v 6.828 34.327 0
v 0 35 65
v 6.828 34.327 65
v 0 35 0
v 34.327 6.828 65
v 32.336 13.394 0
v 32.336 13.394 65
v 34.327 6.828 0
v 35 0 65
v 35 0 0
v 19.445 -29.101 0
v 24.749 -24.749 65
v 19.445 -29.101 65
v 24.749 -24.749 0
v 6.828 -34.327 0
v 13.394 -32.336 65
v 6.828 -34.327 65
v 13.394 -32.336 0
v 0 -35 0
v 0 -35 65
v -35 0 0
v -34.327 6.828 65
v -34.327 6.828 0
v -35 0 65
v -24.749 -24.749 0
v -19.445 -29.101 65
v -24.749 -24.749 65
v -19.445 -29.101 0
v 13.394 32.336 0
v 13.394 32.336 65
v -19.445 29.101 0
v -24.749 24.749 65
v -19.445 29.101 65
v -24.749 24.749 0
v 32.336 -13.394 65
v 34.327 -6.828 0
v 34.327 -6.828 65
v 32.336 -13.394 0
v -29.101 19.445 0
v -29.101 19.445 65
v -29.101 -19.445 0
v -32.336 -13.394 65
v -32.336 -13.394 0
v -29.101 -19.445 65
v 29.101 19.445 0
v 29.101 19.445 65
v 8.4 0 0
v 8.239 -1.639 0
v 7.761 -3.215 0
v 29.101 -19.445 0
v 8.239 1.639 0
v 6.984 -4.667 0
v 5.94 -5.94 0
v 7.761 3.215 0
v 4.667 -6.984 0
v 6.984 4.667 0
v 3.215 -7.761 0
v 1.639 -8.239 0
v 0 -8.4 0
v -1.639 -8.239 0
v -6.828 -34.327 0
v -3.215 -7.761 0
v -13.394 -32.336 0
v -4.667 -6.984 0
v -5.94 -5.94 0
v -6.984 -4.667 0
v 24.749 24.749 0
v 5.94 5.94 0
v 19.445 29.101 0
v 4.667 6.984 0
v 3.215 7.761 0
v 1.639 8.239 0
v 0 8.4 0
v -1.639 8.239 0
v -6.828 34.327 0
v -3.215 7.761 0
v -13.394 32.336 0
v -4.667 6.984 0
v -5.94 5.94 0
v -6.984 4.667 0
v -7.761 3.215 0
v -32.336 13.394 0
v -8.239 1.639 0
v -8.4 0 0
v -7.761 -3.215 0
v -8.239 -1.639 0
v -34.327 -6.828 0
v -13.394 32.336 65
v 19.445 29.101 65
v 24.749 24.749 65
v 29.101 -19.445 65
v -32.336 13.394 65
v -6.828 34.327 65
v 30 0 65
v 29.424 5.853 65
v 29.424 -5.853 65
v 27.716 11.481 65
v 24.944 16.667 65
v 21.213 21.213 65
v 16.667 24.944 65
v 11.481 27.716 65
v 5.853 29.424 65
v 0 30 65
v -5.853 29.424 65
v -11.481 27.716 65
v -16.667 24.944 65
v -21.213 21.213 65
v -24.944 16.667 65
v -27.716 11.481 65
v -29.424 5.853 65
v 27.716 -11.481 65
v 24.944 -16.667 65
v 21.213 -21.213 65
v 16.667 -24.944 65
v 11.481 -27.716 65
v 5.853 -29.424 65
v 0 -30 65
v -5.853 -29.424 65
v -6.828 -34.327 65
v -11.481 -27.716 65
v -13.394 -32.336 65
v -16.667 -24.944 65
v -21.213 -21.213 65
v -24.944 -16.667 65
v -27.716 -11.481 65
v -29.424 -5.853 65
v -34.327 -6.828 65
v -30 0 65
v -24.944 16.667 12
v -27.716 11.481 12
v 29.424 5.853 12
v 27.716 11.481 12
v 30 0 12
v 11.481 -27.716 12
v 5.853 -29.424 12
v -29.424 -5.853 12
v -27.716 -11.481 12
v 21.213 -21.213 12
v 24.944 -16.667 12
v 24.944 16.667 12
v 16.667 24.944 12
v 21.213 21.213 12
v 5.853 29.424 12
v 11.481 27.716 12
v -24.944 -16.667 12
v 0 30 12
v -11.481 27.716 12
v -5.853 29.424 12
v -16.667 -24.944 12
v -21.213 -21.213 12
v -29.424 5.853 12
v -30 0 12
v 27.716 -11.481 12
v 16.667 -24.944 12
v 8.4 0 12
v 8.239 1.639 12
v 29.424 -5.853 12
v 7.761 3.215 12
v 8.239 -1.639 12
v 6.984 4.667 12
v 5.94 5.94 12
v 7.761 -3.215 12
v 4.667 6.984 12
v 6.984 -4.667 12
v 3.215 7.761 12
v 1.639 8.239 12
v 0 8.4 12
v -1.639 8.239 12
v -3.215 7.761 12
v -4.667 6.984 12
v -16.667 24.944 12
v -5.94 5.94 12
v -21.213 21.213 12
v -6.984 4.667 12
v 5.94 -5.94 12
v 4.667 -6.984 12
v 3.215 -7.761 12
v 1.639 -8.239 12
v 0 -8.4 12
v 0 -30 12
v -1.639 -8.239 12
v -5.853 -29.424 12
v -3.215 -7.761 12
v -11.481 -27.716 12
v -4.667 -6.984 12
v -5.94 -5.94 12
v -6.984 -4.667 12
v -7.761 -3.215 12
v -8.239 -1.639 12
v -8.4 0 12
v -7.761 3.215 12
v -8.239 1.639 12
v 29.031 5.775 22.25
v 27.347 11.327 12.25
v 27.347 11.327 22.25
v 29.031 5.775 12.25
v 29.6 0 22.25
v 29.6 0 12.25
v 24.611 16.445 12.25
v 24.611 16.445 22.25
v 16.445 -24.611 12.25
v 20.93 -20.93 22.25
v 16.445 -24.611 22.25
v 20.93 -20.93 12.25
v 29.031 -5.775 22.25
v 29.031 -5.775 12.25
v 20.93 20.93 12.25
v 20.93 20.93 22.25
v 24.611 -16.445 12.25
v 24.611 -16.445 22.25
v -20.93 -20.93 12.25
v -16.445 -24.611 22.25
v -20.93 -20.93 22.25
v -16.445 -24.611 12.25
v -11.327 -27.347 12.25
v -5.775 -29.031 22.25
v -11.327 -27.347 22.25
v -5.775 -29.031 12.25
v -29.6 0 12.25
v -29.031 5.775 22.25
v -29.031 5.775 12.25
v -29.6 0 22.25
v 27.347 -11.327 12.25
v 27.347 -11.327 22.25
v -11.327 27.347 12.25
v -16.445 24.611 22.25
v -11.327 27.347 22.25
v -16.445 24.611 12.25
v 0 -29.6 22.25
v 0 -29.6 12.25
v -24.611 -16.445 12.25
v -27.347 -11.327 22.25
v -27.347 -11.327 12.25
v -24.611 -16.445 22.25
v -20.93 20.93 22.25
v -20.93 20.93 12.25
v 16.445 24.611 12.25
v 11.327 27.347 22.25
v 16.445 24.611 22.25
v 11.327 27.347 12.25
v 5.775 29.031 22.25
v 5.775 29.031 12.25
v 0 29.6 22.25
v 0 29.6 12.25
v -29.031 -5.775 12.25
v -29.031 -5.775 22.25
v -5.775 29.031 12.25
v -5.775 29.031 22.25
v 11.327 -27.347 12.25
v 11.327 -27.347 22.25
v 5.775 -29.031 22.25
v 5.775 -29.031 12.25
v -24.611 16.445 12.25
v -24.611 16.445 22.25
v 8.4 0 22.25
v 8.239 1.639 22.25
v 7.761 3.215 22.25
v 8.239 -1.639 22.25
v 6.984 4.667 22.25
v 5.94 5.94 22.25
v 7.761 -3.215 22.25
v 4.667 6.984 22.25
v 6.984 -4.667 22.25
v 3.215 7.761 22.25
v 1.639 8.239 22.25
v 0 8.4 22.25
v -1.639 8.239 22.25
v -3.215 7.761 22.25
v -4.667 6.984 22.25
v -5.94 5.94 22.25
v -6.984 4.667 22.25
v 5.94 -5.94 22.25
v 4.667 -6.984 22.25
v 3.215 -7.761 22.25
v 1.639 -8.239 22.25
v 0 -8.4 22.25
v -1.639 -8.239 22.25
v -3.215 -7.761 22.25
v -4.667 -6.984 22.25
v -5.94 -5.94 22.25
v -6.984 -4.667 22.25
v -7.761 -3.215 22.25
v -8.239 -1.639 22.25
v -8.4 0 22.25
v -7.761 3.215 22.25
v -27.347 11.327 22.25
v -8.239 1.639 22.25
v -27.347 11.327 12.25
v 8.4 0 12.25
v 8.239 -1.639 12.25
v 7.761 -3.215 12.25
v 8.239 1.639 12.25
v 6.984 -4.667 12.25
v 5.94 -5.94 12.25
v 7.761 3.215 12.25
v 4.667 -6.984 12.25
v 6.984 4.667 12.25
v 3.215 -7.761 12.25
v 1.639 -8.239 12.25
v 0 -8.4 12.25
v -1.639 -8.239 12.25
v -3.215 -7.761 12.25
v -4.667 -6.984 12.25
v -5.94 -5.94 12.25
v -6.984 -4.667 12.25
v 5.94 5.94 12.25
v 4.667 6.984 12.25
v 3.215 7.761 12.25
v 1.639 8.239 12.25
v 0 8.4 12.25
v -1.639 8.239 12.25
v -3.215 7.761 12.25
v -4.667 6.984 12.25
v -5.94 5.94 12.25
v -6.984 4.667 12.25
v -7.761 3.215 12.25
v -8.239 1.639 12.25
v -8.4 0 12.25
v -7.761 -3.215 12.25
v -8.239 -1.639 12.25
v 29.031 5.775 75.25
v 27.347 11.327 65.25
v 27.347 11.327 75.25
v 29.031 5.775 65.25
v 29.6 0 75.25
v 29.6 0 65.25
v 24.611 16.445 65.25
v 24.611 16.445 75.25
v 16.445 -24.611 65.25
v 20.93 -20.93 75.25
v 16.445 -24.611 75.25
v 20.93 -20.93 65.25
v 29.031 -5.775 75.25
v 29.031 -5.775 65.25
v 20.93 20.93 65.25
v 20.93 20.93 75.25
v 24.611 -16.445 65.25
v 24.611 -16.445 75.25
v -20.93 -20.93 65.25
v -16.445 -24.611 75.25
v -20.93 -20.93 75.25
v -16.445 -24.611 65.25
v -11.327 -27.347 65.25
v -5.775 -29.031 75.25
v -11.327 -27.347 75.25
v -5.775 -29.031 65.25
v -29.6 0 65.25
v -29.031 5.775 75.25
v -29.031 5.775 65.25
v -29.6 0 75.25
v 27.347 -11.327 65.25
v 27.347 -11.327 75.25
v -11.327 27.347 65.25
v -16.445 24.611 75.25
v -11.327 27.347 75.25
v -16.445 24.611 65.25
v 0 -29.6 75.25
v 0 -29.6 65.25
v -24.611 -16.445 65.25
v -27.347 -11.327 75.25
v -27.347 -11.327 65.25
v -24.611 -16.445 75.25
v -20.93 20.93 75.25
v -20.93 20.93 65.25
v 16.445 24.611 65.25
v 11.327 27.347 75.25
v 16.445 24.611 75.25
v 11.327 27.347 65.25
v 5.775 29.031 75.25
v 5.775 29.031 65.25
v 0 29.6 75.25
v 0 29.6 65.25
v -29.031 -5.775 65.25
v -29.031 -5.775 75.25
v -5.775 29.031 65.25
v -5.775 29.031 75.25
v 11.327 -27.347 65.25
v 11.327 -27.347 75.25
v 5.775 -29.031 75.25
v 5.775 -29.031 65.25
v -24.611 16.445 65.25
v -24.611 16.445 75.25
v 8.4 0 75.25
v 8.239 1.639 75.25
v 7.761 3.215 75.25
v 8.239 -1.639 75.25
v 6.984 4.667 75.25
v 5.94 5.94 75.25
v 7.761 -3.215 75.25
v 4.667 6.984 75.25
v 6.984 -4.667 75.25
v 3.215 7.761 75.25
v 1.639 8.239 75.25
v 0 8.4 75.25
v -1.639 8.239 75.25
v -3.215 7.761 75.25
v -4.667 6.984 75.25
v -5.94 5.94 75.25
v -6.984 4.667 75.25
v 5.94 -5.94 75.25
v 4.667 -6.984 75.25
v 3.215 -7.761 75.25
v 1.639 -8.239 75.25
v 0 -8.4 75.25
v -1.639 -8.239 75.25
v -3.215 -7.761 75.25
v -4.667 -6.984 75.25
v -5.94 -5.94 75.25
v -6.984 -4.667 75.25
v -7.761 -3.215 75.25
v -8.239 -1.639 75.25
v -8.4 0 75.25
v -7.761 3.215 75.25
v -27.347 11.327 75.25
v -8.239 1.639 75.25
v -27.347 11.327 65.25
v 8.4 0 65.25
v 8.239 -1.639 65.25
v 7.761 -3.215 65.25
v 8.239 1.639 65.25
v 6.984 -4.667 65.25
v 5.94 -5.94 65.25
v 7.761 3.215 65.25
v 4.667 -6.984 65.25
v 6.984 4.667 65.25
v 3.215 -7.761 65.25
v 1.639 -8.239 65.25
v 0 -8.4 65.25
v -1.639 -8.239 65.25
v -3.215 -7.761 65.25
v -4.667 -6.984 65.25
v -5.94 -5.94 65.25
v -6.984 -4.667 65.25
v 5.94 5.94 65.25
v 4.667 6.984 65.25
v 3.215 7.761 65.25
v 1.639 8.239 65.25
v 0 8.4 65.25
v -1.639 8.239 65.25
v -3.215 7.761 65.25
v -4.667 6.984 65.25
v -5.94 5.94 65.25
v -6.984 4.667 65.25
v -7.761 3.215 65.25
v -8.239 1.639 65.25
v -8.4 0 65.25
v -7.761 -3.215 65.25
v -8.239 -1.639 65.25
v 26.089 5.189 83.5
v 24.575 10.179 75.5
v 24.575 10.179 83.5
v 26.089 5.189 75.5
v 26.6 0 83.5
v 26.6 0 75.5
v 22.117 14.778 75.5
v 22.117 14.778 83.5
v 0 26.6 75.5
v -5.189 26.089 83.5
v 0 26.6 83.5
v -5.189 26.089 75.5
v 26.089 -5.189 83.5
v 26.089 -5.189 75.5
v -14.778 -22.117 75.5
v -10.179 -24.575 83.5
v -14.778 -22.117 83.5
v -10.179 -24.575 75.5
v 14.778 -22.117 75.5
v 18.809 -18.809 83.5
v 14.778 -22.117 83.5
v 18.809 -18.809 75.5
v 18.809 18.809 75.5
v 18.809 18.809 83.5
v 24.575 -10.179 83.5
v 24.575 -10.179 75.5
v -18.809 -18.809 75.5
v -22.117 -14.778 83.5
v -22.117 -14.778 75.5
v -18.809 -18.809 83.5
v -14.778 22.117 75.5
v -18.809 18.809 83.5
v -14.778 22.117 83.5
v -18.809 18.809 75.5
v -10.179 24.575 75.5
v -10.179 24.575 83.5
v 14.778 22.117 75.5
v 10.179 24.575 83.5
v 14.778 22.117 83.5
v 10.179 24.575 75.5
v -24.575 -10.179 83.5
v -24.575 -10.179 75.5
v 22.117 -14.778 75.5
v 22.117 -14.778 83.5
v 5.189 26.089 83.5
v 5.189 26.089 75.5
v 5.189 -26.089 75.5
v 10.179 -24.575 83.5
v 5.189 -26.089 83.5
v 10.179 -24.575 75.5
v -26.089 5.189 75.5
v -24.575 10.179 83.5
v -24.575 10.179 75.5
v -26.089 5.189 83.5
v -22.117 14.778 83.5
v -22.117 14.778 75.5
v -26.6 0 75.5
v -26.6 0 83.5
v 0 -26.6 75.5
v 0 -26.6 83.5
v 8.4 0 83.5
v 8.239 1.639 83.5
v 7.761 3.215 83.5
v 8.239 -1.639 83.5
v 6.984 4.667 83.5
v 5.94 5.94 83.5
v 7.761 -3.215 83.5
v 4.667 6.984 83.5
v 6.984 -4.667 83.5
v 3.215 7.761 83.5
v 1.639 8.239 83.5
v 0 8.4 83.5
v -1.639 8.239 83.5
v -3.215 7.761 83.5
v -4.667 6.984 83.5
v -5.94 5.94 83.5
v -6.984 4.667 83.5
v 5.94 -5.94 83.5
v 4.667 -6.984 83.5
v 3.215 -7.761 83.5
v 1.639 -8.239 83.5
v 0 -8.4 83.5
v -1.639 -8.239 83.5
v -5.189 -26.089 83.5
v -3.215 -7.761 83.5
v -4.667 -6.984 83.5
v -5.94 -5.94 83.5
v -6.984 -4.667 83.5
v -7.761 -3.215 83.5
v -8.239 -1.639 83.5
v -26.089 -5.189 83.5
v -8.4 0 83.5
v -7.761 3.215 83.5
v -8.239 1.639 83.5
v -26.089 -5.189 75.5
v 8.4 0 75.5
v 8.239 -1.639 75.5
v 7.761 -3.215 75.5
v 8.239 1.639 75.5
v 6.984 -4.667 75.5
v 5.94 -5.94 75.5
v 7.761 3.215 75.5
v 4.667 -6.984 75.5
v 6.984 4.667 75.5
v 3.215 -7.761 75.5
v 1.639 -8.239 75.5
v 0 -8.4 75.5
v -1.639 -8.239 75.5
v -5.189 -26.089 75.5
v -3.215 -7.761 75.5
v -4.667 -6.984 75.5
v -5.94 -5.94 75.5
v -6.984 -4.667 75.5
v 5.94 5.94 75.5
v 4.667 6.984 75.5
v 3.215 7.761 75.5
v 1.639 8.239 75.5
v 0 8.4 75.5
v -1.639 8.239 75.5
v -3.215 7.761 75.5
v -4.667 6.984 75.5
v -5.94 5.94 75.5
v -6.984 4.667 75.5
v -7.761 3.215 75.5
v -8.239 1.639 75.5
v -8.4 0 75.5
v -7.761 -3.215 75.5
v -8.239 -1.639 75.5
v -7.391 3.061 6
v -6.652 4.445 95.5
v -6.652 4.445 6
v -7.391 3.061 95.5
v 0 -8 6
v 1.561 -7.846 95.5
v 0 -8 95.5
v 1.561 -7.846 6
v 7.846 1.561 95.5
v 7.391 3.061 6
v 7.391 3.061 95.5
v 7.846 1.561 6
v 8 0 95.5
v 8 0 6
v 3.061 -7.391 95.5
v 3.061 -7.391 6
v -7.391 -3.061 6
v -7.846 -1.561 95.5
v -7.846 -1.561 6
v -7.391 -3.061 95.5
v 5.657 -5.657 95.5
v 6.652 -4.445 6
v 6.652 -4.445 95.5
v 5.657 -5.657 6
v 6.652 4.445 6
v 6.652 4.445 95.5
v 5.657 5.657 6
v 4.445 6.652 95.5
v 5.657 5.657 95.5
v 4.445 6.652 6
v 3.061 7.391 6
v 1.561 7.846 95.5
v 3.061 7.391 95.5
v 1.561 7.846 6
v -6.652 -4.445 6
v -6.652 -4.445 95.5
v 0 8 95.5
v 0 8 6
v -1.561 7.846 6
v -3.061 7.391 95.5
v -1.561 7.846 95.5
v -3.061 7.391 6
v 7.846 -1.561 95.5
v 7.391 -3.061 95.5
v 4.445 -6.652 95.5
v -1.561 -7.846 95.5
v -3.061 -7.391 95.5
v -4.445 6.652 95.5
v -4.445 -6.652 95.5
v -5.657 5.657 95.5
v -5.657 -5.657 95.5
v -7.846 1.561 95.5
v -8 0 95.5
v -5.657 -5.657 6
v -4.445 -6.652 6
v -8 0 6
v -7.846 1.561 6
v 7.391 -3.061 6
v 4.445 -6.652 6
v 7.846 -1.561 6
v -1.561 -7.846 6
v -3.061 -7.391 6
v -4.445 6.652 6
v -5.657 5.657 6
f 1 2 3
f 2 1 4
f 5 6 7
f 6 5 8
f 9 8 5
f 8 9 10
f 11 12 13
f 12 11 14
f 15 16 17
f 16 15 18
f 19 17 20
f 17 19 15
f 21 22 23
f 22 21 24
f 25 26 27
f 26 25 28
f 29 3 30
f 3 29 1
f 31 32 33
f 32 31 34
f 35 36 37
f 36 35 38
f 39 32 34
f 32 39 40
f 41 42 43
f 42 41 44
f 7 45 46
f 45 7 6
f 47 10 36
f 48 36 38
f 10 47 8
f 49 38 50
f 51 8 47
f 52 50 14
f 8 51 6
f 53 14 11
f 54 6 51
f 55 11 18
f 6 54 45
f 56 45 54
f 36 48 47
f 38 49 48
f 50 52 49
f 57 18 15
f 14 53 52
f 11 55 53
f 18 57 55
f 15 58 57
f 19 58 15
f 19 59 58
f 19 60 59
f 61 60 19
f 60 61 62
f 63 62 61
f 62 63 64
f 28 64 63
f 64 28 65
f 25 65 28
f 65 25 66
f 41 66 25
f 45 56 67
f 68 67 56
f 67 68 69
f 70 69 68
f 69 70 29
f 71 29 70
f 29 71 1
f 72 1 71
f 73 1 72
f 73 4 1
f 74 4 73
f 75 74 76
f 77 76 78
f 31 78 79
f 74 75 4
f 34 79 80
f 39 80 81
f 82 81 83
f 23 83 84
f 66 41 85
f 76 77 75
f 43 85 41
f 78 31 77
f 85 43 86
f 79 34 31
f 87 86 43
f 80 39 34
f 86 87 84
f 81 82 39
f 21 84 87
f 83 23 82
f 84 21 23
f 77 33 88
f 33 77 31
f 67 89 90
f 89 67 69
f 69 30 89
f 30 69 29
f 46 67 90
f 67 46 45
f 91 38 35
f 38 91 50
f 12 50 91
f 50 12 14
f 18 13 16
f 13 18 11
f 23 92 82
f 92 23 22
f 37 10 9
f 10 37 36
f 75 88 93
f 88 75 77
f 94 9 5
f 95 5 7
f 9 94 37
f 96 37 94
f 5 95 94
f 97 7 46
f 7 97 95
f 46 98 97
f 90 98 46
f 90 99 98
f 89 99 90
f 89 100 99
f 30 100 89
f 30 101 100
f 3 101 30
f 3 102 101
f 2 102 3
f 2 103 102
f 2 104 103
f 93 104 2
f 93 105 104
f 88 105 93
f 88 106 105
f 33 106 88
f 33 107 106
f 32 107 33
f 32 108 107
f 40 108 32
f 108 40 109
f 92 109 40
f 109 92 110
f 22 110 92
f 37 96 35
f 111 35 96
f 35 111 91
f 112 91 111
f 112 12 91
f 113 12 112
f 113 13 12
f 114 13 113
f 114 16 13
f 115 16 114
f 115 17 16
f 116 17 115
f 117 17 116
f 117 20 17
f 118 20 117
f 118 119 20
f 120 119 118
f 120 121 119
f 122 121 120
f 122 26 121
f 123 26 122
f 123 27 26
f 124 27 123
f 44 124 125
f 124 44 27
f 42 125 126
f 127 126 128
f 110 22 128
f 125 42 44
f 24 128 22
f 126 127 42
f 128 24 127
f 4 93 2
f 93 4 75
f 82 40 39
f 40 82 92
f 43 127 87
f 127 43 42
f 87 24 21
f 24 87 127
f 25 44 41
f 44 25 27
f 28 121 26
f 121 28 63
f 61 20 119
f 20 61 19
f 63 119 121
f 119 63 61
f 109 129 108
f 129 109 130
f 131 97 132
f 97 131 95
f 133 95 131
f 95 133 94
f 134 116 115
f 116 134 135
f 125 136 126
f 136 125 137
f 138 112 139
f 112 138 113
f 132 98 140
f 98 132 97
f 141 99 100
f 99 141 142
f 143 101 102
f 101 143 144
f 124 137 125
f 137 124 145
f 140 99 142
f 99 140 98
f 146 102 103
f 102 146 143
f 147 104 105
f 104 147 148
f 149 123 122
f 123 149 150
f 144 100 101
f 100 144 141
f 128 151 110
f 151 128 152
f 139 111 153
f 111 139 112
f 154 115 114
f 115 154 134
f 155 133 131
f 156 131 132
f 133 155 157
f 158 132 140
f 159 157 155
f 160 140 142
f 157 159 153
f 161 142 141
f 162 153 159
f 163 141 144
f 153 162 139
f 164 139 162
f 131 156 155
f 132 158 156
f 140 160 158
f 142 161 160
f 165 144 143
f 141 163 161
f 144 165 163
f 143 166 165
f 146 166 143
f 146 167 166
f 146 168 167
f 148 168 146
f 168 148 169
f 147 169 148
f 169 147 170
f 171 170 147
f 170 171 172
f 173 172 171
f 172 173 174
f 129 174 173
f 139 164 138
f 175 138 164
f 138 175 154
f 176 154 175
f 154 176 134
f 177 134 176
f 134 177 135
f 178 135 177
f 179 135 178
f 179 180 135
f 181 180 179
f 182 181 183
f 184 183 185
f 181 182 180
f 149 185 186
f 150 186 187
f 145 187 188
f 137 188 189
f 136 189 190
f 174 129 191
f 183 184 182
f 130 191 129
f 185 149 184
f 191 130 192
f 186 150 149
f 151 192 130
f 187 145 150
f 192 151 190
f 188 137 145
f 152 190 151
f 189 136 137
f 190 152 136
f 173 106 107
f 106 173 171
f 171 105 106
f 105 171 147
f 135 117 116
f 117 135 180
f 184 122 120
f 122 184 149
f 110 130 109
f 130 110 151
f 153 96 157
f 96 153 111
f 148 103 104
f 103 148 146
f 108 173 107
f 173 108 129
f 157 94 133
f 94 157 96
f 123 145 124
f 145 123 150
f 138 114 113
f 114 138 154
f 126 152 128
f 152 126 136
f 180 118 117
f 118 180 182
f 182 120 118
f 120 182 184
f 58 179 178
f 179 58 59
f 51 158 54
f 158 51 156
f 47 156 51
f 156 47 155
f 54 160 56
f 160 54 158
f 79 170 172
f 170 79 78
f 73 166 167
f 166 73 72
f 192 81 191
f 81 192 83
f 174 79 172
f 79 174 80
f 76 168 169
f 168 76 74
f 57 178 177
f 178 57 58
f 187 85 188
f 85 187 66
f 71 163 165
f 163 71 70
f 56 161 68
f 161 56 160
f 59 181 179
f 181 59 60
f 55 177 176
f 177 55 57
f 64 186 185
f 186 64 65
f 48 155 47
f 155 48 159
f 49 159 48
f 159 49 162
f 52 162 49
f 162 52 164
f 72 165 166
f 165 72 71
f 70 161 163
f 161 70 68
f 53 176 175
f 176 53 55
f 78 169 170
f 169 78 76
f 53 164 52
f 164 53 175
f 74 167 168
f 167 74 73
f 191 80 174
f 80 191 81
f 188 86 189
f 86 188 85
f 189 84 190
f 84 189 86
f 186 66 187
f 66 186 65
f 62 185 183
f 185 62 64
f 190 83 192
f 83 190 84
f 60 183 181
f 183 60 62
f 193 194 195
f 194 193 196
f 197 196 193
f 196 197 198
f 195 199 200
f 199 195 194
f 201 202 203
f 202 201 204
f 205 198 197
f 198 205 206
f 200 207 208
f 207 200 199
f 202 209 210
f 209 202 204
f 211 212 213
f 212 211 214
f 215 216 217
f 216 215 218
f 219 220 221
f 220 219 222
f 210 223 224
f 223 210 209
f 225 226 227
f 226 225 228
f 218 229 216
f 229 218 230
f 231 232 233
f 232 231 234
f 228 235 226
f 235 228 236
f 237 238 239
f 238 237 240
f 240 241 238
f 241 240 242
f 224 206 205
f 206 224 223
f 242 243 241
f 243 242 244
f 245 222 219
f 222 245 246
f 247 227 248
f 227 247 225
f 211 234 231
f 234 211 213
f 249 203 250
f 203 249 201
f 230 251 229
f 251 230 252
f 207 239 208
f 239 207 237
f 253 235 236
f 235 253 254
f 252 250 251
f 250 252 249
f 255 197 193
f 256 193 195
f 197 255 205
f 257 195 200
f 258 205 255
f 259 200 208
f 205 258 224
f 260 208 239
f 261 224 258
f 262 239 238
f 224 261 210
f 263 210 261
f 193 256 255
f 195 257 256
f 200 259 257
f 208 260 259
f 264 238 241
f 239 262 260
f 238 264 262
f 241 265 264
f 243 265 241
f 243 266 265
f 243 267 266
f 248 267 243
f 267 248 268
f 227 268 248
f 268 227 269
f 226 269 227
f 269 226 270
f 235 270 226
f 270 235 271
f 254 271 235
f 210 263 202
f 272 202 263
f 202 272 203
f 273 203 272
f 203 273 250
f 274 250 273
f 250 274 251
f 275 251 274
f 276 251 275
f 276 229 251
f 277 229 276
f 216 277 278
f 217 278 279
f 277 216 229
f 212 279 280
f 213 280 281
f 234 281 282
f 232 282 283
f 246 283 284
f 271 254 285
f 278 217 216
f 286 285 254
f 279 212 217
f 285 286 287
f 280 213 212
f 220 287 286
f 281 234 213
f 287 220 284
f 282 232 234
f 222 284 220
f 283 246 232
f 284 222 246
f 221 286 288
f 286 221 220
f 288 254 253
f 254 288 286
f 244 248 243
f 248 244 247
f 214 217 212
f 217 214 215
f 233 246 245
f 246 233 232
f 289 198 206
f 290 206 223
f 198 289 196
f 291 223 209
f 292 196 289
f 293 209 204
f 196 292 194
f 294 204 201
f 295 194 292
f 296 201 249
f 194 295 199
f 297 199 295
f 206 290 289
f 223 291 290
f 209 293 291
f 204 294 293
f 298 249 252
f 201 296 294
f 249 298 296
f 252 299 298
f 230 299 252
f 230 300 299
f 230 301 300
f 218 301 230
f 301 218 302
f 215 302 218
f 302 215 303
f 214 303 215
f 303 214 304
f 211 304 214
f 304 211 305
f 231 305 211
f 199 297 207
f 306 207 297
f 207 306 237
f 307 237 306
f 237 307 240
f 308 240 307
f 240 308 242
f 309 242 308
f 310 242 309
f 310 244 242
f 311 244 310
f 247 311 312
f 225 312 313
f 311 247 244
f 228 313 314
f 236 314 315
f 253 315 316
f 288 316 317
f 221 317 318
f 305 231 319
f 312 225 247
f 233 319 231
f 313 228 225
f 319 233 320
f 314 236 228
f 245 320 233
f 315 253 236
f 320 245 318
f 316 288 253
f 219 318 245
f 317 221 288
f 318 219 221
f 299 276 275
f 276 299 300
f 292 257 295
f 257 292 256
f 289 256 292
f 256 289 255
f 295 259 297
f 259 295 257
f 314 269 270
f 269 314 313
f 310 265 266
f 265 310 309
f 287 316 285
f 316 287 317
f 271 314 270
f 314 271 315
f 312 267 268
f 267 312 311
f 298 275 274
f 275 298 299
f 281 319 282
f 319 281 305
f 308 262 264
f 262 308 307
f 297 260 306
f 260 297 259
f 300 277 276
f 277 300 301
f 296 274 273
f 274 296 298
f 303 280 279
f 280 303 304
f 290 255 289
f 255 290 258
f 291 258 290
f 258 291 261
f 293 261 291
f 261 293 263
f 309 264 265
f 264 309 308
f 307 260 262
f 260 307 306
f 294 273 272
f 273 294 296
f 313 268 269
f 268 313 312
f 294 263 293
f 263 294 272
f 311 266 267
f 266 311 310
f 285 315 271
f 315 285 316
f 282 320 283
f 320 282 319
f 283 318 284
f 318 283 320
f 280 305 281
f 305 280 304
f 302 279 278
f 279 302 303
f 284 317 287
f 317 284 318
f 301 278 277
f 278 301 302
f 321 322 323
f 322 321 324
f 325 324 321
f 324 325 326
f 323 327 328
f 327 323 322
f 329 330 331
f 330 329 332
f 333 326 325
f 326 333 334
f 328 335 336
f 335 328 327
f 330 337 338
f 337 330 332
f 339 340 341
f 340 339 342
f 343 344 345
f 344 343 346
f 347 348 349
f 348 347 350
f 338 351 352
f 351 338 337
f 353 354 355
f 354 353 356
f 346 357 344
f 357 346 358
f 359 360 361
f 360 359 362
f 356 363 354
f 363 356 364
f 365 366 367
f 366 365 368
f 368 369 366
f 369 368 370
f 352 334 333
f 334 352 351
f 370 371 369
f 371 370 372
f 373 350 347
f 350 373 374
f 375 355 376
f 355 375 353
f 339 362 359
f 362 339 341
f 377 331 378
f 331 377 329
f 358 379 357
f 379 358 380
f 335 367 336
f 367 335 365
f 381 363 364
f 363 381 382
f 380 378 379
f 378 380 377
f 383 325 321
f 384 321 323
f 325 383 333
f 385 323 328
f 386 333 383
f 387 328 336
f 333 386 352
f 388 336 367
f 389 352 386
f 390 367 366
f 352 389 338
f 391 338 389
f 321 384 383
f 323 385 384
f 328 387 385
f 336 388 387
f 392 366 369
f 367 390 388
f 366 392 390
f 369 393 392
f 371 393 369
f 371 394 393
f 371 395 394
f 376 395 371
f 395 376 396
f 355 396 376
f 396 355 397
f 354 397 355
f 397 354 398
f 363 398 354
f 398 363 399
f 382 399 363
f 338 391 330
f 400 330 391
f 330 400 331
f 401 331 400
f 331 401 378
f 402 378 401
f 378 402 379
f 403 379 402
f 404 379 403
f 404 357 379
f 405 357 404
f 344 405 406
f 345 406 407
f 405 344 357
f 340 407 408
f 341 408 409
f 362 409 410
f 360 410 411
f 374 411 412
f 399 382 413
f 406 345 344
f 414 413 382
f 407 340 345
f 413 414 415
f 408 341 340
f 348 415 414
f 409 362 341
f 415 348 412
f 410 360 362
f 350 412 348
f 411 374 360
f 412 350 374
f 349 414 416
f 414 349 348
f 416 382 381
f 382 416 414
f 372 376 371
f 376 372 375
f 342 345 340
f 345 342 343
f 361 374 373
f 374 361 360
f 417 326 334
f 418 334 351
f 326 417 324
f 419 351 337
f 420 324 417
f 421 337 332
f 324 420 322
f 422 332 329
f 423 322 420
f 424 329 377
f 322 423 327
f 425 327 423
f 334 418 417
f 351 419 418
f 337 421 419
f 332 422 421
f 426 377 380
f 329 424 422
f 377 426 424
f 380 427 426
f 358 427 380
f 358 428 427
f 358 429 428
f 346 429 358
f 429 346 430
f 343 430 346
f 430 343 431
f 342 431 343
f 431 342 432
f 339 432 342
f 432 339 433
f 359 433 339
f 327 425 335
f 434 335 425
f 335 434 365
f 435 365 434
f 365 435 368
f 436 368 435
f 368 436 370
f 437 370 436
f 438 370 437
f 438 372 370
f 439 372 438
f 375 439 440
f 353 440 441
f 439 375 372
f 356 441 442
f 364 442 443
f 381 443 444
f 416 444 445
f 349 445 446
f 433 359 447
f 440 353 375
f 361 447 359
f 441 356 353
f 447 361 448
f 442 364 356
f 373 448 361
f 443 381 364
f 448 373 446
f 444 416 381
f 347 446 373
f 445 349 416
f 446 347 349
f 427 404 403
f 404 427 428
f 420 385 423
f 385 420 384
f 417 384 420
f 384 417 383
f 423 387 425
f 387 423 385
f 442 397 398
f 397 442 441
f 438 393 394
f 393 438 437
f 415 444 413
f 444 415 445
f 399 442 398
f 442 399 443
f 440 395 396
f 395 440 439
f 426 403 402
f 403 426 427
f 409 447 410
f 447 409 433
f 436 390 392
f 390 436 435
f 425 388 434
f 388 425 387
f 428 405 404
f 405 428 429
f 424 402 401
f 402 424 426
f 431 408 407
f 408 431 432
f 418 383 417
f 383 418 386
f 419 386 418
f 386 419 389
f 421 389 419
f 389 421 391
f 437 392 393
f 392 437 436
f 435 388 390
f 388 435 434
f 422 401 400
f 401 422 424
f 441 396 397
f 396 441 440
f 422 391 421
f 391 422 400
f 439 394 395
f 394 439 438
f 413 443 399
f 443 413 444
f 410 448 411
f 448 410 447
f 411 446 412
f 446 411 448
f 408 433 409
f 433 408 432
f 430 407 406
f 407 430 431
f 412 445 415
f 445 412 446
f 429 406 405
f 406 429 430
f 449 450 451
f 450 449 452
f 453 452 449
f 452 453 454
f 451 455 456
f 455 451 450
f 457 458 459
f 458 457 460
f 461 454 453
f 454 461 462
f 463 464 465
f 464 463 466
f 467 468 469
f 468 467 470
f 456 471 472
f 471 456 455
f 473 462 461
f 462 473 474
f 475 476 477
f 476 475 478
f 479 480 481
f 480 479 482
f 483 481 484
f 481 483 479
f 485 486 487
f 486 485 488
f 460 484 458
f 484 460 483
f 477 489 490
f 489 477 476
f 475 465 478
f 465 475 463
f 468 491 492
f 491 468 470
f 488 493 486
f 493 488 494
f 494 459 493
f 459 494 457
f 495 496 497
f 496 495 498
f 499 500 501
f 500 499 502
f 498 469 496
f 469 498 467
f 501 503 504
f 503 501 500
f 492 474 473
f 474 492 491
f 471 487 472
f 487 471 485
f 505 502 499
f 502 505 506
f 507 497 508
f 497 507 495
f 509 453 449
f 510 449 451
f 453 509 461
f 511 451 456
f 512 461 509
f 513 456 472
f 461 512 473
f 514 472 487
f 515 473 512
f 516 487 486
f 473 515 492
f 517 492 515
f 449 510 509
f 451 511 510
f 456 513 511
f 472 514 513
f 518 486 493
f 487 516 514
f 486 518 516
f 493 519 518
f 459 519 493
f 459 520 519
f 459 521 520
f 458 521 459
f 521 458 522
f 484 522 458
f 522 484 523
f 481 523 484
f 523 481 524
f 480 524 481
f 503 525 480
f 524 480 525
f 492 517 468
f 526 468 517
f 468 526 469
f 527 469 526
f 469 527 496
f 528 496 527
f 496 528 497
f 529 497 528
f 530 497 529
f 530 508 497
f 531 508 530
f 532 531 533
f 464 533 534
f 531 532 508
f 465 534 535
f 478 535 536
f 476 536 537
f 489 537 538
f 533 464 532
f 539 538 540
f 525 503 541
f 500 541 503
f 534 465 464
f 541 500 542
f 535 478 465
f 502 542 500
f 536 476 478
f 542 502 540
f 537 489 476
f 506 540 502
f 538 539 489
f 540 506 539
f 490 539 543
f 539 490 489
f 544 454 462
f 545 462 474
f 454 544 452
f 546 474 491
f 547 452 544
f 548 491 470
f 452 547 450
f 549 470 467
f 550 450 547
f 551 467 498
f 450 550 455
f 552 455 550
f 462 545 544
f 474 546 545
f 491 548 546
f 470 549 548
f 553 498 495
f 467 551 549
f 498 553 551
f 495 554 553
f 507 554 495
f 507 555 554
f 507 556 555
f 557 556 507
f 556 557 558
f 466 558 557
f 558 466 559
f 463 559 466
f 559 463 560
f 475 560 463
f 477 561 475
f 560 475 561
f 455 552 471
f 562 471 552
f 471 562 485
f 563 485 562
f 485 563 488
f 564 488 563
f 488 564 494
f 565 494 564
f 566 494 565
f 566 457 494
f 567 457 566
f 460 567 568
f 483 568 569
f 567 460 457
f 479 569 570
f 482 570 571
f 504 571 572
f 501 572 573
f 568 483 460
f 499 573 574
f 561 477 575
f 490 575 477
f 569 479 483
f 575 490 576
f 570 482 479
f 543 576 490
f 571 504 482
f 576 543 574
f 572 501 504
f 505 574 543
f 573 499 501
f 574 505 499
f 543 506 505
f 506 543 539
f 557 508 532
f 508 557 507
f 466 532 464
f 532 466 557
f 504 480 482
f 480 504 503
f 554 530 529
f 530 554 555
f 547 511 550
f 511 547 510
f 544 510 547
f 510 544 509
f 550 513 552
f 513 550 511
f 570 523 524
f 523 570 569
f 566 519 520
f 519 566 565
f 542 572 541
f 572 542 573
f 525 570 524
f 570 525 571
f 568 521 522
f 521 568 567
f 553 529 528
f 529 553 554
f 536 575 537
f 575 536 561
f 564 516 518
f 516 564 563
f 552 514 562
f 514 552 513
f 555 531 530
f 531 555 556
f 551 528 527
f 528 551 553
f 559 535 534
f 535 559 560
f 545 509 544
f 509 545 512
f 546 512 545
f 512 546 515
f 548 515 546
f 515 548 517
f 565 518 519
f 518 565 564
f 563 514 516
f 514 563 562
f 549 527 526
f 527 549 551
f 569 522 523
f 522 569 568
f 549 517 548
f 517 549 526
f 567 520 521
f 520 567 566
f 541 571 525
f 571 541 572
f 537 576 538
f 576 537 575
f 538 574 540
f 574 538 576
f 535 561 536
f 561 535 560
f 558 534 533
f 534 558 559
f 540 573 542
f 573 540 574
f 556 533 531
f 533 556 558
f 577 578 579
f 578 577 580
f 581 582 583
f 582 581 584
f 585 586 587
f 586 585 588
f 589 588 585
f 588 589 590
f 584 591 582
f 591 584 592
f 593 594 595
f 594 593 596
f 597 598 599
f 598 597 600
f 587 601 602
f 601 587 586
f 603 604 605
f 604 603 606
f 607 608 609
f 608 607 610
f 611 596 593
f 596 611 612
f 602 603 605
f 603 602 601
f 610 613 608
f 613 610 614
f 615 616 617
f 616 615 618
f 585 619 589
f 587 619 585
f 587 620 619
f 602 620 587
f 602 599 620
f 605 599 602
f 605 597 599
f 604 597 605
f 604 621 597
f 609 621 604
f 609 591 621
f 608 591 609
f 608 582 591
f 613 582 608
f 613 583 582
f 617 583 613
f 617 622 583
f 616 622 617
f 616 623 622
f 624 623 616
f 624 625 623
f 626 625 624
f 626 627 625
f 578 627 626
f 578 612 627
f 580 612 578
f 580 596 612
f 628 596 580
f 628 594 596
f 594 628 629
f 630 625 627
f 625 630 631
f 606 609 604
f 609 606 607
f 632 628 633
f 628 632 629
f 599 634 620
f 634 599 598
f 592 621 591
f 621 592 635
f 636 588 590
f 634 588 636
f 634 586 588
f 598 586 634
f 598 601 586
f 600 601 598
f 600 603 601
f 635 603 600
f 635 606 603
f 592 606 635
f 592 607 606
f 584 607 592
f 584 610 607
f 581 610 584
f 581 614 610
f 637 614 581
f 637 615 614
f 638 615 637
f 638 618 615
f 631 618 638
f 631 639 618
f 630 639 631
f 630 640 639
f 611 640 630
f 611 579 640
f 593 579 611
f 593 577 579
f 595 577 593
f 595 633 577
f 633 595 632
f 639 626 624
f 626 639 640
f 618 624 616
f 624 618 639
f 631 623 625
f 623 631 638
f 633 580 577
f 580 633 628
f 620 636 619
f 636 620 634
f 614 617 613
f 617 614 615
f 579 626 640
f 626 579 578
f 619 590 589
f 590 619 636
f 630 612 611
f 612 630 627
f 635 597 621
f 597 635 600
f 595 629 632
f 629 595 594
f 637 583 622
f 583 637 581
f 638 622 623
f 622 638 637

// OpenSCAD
$fn = 32;

// ------------------------------------------------------------------------
// Bearing housing: housing d70, two bearings and a shaft
// Every part is its own module, assembly() places them once.
// ------------------------------------------------------------------------

// --- part 1 ---
module housing() {
  difference() {
    cylinder(h = 65, d = 70);
    translate([0, 0, 12]) cylinder(h = 54, d = 60);
    translate([0, 0, -1]) cylinder(h = 14, d = 16.8);
  }
}

// --- part 2 ---
module bearing_lower() {
  difference() {
      translate([0, 0, 0]) cylinder(h = 10, d = 59.2);
      translate([0, 0, -1]) cylinder(h = 12, d = 16.8);
    }
}

// --- part 3 ---
module bearing_upper() {
  difference() {
      translate([0, 0, 0]) cylinder(h = 10, d = 59.2);
      translate([0, 0, -1]) cylinder(h = 12, d = 16.8);
    }
}

// --- part 4 ---
module spacer() {
  difference() {
      translate([0, 0, 0]) cylinder(h = 8, d = 53.2);
      translate([0, 0, -1]) cylinder(h = 10, d = 16.8);
    }
}

// --- part 5 ---
module shaft() {
  translate([0, 0, -44.75]) cylinder(h = 89.5, d = 16);
}

// --- assembly ---
module assembly() {
  translate([0, 0, 0]) rotate([0, 0, 0]) housing();
  translate([0, 0, 12.25]) rotate([0, 0, 0]) bearing_lower();
  translate([0, 0, 65.25]) rotate([0, 0, 0]) bearing_upper();
  translate([0, 0, 75.5]) rotate([0, 0, 0]) spacer();
  translate([0, 0, 50.75]) rotate([0, 0, 0]) shaft();
}

assembly();
